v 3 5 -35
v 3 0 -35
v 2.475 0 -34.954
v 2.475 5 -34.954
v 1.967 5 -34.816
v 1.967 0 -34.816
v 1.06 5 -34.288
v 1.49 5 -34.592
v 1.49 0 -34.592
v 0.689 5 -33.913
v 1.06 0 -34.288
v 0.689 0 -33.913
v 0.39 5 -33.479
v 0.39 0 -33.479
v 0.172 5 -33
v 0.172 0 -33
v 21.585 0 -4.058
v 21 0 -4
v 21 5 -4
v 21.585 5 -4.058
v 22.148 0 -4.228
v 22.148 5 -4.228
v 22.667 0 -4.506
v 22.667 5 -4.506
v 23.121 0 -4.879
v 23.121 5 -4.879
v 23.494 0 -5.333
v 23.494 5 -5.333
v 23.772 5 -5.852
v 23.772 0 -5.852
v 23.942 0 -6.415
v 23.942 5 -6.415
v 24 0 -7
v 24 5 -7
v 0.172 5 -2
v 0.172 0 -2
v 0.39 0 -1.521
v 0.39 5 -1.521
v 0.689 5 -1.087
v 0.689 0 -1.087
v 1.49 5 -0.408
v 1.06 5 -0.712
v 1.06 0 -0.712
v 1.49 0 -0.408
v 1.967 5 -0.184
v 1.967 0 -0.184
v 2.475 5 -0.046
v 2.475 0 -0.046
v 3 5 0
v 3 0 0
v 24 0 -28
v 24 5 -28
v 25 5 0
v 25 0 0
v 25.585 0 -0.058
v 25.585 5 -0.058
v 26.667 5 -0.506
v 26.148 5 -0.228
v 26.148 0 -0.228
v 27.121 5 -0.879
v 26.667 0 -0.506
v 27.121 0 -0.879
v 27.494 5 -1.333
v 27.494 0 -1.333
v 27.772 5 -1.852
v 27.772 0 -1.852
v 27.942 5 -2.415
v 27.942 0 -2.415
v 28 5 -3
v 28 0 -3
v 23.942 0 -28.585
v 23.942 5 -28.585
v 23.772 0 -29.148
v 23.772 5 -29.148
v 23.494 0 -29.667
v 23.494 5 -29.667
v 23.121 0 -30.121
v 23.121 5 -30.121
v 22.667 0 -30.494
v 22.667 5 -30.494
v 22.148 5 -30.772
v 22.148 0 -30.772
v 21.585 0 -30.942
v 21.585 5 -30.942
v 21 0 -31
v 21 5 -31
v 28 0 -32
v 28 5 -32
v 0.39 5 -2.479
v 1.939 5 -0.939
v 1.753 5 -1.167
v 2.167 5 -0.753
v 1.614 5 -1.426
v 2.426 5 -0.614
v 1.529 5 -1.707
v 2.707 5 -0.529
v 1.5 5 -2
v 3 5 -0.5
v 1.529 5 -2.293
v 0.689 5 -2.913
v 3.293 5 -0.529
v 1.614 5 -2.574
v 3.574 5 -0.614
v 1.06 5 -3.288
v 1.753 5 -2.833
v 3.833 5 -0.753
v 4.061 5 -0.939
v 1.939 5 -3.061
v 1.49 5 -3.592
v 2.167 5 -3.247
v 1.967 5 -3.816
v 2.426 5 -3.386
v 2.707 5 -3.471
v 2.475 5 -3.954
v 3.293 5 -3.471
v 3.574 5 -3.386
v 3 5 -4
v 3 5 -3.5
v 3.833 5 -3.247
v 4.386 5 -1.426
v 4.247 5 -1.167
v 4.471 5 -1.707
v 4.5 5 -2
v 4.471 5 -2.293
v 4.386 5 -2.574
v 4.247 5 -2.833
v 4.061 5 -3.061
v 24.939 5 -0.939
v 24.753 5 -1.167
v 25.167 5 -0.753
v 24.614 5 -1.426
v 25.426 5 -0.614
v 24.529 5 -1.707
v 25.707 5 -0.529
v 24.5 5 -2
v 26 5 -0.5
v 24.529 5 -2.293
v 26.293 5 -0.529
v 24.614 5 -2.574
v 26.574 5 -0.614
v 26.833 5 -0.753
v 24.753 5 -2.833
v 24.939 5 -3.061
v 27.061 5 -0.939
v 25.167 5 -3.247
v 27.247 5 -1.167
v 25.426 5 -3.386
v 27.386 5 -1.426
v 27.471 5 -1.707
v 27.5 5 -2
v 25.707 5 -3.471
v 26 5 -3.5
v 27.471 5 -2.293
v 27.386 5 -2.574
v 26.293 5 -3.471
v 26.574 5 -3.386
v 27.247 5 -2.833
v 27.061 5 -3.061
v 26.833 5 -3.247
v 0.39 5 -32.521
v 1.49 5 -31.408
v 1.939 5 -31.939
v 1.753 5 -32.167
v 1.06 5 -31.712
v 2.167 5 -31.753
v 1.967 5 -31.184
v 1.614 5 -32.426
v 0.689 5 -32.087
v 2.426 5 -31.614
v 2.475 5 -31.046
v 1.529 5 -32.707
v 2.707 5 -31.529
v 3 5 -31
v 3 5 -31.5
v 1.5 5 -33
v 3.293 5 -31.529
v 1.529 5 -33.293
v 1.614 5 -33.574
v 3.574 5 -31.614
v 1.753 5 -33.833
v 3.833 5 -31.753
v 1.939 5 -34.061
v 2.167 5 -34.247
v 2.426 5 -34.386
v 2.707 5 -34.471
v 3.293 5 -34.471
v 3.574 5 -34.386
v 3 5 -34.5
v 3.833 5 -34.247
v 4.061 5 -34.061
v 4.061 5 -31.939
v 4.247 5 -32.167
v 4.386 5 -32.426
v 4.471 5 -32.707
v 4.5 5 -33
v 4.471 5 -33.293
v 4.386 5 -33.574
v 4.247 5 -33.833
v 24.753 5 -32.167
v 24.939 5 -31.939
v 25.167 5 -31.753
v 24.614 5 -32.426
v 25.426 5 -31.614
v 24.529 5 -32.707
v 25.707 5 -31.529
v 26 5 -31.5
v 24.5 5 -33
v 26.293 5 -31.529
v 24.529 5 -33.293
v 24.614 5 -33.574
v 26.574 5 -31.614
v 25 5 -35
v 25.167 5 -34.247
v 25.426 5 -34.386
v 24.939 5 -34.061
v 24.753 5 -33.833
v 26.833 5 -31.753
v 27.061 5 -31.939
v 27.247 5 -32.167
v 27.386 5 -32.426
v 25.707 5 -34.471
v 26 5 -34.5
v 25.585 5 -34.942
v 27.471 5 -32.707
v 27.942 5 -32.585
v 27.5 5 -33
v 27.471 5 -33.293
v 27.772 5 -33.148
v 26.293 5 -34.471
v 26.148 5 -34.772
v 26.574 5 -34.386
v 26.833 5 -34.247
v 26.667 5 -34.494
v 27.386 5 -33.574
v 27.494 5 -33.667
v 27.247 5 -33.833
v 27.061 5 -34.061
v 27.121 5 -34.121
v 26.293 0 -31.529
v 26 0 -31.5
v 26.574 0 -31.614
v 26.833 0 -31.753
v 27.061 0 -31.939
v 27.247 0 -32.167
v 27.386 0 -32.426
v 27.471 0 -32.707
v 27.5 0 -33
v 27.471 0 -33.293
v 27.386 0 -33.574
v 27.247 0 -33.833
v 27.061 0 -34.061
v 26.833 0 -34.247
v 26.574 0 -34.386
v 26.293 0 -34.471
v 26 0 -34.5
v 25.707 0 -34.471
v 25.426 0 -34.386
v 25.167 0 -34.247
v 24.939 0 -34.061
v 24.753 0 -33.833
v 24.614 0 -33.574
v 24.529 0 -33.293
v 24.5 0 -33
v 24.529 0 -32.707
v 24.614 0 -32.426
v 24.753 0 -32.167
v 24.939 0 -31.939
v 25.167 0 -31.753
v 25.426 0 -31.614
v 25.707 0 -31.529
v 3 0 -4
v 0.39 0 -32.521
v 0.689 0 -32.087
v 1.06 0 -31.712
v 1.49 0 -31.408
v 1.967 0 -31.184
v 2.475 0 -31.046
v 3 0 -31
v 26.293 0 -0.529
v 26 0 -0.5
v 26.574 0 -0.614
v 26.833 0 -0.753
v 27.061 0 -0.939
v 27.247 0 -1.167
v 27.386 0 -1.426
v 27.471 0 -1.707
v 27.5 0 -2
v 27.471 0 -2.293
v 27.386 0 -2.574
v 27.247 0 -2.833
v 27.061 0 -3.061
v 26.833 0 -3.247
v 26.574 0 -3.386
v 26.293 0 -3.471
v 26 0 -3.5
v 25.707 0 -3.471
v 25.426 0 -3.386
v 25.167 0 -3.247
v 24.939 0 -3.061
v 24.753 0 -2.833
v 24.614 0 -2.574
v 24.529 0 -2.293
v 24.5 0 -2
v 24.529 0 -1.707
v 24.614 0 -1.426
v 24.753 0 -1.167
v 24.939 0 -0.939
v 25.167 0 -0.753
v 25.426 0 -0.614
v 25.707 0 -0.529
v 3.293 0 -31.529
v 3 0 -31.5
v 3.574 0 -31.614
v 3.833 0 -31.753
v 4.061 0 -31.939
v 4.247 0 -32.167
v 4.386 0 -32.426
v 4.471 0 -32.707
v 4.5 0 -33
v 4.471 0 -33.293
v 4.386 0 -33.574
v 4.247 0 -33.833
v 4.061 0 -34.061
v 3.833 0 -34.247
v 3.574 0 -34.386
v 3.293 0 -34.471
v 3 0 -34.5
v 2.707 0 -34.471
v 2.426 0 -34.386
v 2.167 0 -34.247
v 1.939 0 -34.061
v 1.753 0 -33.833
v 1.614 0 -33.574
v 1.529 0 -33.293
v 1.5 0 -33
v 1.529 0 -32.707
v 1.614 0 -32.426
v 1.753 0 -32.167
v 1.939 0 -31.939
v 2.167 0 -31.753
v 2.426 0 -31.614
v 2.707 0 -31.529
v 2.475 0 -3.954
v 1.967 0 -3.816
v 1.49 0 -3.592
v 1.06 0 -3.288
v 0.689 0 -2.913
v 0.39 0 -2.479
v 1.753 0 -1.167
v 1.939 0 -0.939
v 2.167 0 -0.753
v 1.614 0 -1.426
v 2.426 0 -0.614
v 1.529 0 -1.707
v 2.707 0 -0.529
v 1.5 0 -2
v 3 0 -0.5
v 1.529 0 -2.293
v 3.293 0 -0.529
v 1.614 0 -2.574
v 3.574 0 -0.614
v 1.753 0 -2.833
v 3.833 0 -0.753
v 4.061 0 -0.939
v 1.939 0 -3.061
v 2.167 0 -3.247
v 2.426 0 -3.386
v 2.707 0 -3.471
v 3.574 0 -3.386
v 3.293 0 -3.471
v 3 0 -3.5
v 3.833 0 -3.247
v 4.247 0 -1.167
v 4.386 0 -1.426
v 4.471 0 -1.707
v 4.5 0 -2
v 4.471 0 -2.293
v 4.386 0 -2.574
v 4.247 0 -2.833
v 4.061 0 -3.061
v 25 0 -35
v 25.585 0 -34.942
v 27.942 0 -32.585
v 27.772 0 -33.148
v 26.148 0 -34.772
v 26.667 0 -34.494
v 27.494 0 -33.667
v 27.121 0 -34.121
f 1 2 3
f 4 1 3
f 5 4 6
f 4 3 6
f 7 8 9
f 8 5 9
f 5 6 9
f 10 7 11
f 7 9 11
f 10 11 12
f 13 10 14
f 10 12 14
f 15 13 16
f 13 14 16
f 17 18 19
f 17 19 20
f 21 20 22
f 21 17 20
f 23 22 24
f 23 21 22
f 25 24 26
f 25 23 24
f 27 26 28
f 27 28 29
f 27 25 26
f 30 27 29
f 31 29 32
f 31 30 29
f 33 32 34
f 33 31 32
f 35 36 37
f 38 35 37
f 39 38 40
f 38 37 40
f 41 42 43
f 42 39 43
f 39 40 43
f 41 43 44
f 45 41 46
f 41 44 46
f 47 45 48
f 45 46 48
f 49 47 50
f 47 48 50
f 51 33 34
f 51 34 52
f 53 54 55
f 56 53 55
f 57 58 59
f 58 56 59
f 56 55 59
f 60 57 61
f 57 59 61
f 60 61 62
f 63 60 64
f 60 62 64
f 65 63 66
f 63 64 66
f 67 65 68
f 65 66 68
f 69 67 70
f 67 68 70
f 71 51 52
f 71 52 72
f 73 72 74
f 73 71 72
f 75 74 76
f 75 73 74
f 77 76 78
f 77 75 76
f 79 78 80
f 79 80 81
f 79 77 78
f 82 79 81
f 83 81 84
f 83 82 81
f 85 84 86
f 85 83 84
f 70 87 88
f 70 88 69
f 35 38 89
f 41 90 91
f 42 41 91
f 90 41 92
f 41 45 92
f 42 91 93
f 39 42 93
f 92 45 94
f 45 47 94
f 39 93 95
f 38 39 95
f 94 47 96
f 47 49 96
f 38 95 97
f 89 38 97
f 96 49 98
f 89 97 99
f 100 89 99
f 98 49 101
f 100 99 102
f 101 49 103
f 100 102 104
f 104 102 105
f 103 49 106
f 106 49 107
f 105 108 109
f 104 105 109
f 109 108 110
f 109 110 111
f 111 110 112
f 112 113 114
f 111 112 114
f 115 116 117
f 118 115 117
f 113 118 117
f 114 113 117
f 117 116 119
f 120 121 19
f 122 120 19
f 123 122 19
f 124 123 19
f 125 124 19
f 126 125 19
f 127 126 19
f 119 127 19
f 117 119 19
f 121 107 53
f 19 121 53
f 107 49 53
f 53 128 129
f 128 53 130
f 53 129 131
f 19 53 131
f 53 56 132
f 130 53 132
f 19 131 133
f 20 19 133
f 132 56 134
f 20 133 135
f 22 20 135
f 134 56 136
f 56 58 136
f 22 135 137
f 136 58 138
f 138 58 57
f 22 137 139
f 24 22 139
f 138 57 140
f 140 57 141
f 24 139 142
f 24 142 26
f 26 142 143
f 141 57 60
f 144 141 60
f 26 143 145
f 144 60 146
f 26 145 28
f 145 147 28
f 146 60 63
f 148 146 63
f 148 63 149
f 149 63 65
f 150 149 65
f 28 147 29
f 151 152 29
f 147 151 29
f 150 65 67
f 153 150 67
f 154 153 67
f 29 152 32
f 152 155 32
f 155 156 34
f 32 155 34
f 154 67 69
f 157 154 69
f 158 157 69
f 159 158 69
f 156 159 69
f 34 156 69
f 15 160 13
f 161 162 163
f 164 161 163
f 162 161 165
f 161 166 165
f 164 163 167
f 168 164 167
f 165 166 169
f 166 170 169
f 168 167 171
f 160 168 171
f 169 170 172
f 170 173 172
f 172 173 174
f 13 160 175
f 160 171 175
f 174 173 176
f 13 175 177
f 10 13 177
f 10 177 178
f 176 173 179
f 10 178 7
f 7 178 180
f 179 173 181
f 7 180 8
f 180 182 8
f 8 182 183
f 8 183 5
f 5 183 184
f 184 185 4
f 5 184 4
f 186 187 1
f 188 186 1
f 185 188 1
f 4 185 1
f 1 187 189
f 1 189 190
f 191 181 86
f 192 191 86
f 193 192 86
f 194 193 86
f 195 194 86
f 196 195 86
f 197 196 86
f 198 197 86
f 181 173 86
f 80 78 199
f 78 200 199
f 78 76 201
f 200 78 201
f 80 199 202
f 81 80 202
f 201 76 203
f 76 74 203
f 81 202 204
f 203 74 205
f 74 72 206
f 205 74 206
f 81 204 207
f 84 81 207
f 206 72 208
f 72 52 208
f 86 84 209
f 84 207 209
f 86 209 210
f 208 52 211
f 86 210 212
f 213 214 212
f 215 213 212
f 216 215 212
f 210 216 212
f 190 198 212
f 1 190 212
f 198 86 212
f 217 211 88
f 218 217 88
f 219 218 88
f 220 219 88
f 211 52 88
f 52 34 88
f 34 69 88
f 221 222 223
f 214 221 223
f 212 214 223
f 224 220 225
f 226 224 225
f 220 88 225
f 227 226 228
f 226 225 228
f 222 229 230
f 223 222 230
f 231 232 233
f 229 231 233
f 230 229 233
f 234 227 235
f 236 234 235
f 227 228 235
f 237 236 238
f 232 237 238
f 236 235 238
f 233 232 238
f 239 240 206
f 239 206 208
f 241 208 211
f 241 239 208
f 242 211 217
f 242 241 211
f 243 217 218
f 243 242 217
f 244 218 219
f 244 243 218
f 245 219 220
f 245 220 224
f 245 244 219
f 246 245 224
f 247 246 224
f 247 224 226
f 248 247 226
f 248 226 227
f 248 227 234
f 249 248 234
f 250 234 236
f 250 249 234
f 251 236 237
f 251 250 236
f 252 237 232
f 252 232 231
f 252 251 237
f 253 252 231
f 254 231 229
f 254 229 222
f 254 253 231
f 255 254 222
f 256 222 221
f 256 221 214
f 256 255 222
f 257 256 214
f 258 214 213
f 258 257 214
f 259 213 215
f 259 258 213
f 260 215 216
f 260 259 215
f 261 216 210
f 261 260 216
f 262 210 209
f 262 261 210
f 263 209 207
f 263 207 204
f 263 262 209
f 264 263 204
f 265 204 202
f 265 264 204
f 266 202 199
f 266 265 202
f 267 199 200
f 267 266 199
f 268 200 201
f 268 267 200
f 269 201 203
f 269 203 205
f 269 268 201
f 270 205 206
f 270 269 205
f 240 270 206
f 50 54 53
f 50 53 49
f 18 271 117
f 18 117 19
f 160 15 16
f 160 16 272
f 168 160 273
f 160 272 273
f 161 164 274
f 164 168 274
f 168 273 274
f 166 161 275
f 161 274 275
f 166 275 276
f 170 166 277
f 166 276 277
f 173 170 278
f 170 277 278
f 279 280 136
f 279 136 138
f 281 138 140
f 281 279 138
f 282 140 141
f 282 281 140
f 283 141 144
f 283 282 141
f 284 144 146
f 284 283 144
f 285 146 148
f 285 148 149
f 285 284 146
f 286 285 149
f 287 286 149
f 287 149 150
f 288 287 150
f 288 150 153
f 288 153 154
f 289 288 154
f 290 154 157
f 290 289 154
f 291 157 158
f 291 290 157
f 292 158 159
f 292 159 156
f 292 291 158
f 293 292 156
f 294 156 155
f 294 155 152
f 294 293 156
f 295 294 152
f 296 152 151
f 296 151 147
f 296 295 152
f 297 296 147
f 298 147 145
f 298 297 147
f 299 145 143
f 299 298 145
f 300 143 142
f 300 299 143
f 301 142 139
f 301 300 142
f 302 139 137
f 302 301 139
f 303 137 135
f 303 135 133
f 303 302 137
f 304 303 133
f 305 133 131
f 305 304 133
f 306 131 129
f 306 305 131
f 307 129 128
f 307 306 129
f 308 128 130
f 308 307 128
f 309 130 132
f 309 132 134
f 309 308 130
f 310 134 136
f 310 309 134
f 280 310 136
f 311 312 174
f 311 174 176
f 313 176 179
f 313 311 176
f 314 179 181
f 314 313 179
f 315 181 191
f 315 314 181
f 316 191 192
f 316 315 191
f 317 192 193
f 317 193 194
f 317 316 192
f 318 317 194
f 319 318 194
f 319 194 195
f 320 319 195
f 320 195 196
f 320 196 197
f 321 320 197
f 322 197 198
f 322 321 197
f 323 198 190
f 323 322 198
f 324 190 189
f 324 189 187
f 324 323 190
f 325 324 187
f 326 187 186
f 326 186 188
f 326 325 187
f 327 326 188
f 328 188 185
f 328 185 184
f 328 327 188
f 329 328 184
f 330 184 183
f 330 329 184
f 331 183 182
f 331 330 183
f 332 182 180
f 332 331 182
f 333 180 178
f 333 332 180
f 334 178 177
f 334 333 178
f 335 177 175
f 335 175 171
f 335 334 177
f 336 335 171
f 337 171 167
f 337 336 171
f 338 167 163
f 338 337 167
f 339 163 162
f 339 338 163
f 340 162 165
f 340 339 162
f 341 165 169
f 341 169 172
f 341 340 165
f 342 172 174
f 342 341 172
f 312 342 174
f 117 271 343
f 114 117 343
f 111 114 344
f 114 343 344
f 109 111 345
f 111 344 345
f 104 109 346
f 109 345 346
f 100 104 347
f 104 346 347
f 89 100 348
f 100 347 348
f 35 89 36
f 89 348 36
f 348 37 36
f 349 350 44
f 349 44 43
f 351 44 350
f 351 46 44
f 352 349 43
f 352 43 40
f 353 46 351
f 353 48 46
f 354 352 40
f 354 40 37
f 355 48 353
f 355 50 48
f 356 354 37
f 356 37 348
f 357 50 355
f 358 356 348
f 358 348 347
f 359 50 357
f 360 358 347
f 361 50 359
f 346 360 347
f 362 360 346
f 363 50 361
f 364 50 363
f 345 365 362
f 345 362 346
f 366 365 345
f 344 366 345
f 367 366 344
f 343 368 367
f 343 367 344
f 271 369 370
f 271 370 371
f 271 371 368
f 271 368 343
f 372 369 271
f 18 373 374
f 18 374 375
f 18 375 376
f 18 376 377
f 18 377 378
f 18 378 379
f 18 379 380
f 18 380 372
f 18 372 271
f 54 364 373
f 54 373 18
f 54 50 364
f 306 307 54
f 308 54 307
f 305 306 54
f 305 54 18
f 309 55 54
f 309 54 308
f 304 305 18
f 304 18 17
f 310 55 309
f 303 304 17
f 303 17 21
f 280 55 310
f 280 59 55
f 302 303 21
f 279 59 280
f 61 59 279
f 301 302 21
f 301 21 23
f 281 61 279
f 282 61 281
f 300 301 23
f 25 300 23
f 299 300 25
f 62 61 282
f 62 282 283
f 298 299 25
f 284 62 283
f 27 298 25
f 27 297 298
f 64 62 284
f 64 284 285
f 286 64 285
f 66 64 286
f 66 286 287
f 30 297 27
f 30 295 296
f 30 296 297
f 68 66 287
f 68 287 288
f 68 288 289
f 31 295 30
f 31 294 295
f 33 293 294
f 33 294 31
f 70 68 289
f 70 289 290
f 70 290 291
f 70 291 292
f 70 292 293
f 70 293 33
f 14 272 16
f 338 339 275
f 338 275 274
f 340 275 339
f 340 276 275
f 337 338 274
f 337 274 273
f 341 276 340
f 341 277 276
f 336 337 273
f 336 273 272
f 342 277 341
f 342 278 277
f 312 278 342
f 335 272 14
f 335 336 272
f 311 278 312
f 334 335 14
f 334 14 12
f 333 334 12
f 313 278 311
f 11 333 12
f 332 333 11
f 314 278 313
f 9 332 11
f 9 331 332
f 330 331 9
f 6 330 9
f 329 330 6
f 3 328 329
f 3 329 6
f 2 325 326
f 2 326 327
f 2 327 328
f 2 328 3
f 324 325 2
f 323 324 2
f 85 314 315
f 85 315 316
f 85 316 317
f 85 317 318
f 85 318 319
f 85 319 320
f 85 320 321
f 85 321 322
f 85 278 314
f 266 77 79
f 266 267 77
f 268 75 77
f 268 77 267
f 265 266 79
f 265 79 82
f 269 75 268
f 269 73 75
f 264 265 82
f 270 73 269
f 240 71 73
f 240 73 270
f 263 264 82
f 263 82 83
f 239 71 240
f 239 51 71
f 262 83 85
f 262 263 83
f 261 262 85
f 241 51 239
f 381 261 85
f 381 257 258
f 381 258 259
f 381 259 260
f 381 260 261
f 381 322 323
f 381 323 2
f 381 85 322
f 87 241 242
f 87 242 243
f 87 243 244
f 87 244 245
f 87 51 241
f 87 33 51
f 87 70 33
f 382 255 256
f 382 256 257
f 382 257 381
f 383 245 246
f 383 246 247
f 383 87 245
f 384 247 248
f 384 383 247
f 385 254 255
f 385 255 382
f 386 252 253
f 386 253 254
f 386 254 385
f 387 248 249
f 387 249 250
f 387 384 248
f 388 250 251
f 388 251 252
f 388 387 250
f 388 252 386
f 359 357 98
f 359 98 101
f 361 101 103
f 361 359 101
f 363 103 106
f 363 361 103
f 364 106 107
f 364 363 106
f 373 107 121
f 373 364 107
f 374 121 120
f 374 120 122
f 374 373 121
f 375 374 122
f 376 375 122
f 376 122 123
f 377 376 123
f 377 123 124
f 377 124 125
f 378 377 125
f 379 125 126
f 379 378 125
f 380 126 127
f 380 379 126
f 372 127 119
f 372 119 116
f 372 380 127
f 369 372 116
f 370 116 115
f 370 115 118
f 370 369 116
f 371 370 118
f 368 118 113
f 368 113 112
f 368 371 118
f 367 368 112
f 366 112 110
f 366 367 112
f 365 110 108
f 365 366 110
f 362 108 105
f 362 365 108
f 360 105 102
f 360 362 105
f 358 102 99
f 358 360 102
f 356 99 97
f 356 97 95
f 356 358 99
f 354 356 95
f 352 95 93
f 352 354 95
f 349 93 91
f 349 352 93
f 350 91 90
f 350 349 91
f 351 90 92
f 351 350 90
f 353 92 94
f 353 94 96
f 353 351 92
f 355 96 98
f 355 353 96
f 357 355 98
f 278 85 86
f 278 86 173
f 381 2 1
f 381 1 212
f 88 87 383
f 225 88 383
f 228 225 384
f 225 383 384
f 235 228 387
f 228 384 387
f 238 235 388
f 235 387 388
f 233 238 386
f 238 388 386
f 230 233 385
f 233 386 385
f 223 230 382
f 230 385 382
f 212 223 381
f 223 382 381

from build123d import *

# Parameters (mm, degrees)
SKETCH1_R           = 1.5
BOSS_EXTRUDE1_DEPTH = 5
FILLET2_R           = 3


with BuildPart() as part:
    # Sketch1 → Boss-Extrude1 (new body)
    with BuildSketch(Plane(origin=(0, 0, 0), x_dir=(1, 0, 0), z_dir=(0, 1, 0))):
        Polygon((0, 31), (0, 35), (28, 35), (28, 0), (0, 0), (0, 4), (24, 4), (24, 31), align=None)
        with Locations(Location((26, 2, 0), (0, 0, 270))):
            Circle(SKETCH1_R, mode=Mode.SUBTRACT)
        with Locations(Location((26, 33, 0), (0, 0, 270))):
            Circle(SKETCH1_R, mode=Mode.SUBTRACT)
        with Locations(Location((3, 33, 0), (0, 0, 270))):
            Circle(SKETCH1_R, mode=Mode.SUBTRACT)
        with Locations(Location((3, 2, 0), (0, 0, 270))):
            Circle(SKETCH1_R, mode=Mode.SUBTRACT)
    extrude(amount=BOSS_EXTRUDE1_DEPTH)

    # Fillet2
    # the kernel refuses this fillet: 3 mm, written as the material it adds along each edge
    with BuildSketch(Plane(origin=(24, 0, -31), x_dir=(0, 0, 1), z_dir=(0, 1, 0)), Plane(origin=(24, 0, -4), x_dir=(-1, 0, 0), z_dir=(0, 1, 0))) as fillet2_piece_1:
        with BuildLine():
            CenterArc((FILLET2_R, -FILLET2_R), FILLET2_R, 90, 90)
            Line((0, -FILLET2_R), (0, 0))
            Line((0, 0), (FILLET2_R, 0))
        make_face()
    extrude(amount=5)
    # the kernel refuses this fillet: 3 mm, written as the material it takes off along each edge
    with BuildSketch(Plane(origin=(28, -7.5, -35), x_dir=(-1, 0, 0), z_dir=(0, 1, 0)), Plane(origin=(0, -7.5, -35), x_dir=(0, 0, 1), z_dir=(0, 1, 0)), Plane(origin=(0, -7.5, -4), x_dir=(0, 0, 1), z_dir=(0, 1, 0)), Plane(origin=(0, -7.5, 0), x_dir=(1, 0, 0), z_dir=(0, 1, 0)), Plane(origin=(28, -7.5, 0), x_dir=(0, 0, -1), z_dir=(0, 1, 0))) as fillet2_2_piece_1:
        with BuildLine():
            CenterArc((FILLET2_R, FILLET2_R), FILLET2_R, 180, 90)
            Line((0, FILLET2_R), (0, 0))
            Line((0, 0), (FILLET2_R, 0))
        make_face()
    extrude(amount=20, mode=Mode.SUBTRACT)
    with BuildSketch(Plane(origin=(0, -7.5, -31), x_dir=(0, 0, -1), z_dir=(0, 1, 0))) as fillet2_2_piece_2:
        with BuildLine():
            CenterArc((FILLET2_R, -FILLET2_R), FILLET2_R, 90, 90)
            Line((0, -FILLET2_R), (0, 0))
            Line((0, 0), (FILLET2_R, 0))
        make_face()
    extrude(amount=20, mode=Mode.SUBTRACT)


solid = part.part
